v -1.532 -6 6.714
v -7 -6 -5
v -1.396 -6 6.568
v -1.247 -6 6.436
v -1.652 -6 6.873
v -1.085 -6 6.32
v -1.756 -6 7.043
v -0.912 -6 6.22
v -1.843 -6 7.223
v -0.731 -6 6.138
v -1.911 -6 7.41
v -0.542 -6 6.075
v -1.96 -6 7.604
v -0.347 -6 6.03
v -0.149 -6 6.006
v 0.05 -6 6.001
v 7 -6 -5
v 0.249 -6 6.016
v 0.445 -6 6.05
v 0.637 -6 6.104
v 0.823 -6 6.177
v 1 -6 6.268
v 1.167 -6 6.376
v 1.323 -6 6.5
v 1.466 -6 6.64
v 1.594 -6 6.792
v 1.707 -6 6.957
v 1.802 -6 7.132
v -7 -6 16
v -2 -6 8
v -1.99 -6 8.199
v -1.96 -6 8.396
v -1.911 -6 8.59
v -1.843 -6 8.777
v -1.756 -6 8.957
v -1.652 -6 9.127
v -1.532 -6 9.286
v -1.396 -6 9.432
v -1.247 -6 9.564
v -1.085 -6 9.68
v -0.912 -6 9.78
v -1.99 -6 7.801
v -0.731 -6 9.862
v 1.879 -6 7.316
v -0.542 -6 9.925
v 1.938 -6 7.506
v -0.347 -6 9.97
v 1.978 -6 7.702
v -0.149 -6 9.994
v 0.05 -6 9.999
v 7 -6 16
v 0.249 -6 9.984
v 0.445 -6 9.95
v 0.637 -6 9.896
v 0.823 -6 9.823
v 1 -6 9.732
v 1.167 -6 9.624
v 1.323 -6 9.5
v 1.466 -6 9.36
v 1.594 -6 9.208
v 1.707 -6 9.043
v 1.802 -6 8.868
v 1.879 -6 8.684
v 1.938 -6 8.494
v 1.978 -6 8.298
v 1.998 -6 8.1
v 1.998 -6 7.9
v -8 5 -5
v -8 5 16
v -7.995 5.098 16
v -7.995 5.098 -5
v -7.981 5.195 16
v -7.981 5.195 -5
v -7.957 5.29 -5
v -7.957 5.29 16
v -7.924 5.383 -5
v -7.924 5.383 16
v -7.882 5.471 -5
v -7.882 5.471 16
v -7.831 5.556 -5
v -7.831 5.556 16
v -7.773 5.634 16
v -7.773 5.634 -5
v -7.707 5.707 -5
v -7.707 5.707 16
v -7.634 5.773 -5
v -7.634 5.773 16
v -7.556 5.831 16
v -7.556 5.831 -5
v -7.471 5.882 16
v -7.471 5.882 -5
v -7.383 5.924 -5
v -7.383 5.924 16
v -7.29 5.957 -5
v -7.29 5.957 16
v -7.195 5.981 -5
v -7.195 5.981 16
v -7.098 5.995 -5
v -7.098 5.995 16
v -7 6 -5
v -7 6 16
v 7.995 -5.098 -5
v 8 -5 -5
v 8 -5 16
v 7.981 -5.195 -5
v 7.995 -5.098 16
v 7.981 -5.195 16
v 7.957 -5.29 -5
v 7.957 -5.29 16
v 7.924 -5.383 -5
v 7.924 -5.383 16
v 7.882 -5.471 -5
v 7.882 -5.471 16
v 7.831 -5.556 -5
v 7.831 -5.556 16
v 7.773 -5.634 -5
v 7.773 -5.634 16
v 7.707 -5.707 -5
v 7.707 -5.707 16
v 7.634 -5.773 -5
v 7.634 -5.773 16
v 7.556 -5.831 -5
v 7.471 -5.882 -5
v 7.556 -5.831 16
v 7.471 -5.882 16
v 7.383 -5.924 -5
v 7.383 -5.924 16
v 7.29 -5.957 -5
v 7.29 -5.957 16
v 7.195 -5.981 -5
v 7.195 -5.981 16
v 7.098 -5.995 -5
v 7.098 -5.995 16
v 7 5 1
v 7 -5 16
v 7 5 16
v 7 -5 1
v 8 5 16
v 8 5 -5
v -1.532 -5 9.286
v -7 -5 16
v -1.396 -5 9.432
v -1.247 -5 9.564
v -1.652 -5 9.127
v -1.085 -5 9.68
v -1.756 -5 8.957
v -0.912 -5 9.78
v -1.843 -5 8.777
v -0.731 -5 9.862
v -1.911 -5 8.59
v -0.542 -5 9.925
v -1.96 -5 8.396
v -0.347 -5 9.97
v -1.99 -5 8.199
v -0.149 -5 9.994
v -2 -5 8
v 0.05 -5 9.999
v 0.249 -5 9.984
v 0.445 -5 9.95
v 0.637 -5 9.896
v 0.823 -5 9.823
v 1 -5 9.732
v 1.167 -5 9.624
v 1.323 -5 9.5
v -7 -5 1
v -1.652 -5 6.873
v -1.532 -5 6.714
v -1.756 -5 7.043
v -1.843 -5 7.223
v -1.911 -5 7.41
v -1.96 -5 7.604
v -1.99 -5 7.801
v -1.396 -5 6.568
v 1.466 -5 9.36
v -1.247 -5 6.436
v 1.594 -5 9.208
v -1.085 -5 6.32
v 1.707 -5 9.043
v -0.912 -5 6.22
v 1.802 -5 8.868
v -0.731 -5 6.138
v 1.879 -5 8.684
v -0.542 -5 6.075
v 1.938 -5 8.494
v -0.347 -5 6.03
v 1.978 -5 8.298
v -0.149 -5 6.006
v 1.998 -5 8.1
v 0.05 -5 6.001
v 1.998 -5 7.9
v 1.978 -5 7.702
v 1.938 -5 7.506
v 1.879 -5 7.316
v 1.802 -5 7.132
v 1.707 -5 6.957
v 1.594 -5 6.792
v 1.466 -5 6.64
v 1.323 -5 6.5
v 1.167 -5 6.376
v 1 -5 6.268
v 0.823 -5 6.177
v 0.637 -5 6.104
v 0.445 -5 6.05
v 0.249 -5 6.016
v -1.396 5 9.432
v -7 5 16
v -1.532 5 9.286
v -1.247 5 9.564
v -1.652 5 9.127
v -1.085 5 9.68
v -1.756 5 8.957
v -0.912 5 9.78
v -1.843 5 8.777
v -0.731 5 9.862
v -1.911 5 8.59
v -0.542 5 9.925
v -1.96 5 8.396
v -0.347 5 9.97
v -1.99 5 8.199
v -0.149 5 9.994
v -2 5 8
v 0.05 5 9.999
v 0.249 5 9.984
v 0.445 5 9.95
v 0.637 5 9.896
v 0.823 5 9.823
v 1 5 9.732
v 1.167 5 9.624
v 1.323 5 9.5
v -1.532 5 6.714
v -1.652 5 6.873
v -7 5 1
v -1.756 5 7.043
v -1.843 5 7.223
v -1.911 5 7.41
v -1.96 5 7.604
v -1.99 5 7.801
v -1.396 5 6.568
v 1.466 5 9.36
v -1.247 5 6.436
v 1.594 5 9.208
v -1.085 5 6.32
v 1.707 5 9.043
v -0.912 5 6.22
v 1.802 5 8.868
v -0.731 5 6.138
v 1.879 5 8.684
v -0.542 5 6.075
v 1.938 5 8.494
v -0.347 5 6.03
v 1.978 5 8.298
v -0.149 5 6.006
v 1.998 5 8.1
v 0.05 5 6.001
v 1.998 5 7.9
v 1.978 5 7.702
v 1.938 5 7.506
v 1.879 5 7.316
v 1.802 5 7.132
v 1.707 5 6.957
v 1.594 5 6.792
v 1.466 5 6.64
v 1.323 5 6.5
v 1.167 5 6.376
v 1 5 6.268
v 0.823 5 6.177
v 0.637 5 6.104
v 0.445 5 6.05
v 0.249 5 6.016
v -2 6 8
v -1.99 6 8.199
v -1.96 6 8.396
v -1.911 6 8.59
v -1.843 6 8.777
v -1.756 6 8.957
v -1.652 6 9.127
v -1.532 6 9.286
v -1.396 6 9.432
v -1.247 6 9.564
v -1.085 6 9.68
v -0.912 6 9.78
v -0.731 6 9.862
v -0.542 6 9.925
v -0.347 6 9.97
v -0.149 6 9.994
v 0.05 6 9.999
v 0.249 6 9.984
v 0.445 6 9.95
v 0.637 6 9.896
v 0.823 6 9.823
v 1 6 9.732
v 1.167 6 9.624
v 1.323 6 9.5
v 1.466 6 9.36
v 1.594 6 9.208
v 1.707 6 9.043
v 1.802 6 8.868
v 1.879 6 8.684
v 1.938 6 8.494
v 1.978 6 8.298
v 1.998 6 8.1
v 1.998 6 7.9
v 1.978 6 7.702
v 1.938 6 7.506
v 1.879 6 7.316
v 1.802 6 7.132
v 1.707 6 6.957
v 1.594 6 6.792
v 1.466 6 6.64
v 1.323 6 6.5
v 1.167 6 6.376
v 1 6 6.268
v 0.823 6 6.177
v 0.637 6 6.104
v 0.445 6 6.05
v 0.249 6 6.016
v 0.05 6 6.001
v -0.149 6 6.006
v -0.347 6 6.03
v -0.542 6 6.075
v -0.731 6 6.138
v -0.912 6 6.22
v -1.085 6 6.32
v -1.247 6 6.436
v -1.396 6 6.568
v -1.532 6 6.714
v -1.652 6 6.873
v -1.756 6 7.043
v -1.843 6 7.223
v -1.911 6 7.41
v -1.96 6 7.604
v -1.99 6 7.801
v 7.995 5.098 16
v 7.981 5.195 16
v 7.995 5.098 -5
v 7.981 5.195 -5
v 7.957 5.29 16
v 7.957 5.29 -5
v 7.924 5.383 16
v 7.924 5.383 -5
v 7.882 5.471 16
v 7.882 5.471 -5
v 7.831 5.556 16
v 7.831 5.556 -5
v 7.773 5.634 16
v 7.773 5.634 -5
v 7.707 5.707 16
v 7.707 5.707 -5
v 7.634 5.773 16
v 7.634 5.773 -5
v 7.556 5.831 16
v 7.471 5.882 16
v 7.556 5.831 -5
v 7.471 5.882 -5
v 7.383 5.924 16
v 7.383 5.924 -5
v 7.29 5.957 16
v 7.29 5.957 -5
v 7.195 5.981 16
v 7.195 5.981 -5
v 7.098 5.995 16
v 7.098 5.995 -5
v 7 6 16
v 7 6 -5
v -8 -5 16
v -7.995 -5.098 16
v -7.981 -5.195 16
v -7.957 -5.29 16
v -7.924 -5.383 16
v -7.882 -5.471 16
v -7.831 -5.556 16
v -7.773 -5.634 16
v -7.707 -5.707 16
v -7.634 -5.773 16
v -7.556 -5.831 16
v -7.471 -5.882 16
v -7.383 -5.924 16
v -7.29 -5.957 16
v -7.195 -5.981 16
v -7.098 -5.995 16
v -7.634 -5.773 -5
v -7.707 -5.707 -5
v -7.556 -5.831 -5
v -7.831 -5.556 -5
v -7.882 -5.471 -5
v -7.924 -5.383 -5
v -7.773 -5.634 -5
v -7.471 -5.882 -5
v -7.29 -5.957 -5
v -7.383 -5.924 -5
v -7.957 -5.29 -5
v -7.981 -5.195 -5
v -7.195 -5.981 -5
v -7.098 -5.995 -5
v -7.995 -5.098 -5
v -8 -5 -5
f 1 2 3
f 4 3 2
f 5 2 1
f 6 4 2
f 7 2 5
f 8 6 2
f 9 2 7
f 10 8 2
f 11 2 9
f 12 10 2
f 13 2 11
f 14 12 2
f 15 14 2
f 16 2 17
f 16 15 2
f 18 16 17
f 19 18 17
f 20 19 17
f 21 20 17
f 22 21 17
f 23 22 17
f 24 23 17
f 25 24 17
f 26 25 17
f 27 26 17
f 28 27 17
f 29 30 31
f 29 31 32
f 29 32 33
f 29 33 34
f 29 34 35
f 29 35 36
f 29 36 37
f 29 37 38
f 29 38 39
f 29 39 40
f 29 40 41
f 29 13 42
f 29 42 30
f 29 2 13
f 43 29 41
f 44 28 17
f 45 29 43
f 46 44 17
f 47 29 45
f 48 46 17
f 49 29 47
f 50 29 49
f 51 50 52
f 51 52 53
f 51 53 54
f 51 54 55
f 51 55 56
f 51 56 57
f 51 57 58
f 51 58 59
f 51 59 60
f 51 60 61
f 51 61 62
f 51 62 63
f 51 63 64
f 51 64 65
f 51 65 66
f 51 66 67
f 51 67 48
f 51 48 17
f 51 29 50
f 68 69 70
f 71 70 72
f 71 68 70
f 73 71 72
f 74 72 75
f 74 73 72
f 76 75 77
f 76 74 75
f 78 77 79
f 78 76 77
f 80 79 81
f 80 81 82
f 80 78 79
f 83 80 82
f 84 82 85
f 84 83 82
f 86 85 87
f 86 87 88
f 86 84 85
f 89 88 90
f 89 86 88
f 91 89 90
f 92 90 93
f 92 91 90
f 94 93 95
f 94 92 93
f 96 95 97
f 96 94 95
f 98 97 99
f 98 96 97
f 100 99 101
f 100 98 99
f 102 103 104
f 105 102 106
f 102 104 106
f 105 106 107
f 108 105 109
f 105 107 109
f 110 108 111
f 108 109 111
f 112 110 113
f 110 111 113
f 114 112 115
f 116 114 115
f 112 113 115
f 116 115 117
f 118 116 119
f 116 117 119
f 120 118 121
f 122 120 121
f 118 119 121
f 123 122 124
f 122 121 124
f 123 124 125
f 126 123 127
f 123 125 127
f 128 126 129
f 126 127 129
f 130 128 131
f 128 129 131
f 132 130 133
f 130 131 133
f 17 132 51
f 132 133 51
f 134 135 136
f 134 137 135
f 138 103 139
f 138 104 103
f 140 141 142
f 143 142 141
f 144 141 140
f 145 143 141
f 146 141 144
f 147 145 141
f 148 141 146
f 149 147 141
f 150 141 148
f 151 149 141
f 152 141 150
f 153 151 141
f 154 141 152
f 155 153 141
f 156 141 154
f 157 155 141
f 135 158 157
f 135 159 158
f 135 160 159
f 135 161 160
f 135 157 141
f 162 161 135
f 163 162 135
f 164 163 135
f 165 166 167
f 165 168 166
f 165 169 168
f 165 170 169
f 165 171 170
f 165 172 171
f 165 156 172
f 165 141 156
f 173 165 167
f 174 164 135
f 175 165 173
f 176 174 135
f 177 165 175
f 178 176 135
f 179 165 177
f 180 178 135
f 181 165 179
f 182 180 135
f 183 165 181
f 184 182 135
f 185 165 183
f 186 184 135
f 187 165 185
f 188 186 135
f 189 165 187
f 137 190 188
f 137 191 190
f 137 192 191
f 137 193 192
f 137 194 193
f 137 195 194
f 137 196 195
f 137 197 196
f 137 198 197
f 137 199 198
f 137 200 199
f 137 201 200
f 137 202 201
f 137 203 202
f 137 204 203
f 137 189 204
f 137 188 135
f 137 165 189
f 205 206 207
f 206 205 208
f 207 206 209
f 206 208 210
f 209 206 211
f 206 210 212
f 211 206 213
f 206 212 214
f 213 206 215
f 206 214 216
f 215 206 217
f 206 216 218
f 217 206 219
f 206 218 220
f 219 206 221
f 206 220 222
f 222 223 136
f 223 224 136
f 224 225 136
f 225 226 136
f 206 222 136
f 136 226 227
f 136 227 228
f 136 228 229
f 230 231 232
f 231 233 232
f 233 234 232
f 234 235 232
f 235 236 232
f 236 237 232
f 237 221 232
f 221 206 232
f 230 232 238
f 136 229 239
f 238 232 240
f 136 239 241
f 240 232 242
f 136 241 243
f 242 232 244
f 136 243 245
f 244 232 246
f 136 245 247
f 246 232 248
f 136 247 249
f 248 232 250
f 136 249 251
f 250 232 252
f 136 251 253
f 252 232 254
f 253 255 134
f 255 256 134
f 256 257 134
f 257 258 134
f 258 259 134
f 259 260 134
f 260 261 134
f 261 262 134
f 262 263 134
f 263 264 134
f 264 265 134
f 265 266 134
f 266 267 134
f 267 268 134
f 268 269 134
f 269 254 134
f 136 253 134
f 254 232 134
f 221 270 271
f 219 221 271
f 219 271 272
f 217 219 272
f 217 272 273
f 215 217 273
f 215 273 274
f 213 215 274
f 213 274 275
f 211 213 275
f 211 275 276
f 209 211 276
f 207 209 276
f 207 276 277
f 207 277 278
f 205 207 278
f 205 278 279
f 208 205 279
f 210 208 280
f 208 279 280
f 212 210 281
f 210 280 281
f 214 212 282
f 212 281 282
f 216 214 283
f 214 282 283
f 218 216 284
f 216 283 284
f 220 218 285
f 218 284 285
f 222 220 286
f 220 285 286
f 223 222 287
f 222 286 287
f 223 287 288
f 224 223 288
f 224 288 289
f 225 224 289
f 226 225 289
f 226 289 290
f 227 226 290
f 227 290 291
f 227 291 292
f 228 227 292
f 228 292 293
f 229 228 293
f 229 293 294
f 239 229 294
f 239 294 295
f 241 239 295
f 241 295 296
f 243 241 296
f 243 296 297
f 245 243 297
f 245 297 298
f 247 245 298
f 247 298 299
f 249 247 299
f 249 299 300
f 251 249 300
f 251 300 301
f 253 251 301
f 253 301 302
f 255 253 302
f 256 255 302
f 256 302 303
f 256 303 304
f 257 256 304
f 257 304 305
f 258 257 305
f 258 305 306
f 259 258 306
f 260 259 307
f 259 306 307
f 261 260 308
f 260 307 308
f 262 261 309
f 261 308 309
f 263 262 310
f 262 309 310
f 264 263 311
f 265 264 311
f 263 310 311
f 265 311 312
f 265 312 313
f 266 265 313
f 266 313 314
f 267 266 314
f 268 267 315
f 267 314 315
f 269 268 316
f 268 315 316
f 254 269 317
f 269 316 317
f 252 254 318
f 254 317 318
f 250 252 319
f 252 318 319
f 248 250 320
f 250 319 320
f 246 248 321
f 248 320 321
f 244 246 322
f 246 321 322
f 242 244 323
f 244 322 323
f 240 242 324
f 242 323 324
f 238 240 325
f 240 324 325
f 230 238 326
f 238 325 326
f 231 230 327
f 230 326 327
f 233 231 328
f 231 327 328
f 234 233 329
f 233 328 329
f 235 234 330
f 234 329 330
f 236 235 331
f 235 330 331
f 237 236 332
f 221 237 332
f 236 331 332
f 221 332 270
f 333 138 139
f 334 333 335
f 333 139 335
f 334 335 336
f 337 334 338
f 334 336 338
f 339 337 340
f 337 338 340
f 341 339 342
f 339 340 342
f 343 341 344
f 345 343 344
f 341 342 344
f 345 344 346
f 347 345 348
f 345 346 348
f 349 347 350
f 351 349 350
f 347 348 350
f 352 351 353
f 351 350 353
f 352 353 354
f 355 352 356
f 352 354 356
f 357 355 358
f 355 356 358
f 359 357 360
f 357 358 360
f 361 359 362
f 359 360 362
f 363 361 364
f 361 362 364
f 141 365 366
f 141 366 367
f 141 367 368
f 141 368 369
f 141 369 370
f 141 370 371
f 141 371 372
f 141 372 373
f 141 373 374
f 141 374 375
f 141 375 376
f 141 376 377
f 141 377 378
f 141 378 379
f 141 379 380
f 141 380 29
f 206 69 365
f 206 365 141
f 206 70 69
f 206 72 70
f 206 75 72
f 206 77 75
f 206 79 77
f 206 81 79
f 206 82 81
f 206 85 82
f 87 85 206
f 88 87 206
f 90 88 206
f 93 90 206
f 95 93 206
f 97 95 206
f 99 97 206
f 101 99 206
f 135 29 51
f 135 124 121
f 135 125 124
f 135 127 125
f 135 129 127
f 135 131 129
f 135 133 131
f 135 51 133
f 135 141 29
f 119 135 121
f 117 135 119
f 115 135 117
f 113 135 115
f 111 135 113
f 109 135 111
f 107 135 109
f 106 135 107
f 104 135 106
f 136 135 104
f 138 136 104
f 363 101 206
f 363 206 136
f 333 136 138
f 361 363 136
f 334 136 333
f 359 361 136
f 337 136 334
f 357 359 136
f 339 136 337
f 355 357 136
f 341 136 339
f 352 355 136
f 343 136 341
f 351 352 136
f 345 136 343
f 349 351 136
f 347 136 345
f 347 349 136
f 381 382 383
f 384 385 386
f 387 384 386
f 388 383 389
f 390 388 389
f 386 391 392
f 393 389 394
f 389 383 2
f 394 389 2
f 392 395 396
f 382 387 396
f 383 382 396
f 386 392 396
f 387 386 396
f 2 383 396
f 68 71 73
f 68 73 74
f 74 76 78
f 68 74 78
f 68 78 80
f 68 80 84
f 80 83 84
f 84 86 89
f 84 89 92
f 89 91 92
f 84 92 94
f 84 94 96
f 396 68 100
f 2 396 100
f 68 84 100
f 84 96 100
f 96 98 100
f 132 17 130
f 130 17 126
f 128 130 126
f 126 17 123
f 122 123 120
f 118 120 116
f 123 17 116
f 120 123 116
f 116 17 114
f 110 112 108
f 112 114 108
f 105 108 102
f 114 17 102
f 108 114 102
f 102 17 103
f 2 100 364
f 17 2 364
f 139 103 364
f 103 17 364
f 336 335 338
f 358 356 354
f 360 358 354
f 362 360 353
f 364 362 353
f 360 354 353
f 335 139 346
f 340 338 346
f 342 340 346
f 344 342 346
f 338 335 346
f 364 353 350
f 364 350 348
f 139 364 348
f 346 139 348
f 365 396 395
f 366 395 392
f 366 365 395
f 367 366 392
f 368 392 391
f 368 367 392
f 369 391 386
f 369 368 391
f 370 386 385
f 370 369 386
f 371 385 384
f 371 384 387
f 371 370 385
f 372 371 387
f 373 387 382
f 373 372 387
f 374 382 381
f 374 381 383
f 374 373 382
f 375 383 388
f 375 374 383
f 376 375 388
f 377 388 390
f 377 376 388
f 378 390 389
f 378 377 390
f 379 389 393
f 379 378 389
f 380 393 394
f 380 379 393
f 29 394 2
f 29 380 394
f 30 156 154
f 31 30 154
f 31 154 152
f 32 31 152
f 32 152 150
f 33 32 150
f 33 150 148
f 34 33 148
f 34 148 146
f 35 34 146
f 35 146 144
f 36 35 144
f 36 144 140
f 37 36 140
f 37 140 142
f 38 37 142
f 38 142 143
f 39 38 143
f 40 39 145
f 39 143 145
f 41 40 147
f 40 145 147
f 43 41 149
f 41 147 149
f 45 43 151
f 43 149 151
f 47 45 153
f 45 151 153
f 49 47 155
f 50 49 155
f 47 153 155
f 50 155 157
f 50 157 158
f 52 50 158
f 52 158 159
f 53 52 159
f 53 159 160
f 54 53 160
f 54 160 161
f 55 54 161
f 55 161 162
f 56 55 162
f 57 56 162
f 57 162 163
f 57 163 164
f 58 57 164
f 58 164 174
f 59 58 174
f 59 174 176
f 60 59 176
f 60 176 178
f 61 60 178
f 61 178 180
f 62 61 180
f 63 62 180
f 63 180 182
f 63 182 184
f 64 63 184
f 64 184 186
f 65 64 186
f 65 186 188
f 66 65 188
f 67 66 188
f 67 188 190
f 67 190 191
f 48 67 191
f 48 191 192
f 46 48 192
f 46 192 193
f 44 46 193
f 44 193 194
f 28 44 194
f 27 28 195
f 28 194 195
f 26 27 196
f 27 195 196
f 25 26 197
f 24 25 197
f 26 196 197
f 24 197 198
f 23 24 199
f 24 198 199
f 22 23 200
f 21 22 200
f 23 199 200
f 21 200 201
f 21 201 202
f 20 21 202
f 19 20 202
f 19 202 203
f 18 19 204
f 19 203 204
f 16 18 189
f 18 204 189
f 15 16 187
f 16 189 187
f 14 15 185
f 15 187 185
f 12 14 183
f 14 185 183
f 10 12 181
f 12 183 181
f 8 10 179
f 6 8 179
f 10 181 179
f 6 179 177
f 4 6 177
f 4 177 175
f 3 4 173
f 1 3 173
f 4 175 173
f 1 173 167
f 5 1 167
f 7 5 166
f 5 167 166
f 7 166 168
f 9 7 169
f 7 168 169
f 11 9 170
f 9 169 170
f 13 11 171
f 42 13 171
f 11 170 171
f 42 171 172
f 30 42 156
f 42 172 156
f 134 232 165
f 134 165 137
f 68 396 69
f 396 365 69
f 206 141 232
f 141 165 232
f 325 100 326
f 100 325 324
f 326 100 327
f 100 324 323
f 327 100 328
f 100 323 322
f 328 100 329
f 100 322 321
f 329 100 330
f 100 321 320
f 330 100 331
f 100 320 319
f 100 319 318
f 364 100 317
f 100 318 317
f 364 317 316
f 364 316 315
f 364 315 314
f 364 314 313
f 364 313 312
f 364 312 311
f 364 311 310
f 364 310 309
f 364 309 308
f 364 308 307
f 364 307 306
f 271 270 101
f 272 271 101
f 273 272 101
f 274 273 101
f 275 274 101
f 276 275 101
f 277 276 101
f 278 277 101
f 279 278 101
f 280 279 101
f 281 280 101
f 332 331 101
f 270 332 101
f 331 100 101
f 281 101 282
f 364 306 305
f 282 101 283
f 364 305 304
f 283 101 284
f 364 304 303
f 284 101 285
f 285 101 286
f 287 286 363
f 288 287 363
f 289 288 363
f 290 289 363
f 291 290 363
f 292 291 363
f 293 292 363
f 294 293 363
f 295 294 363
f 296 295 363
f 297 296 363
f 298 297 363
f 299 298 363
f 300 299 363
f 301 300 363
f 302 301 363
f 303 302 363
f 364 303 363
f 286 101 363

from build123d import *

# Parameters (mm, degrees)
F0_W     = 16
F0_H     = 12
F1_DEPTH = 16
F2_T     = -1
F4_D     = 4
F5_DEPTH = 5
F6_R     = 1


with BuildPart() as f1:
    # F0 (on Top) → F1 (new body)
    with BuildSketch(Plane.XY):
        Rectangle(F0_W, F0_H)
    extrude(amount=F1_DEPTH)

    # F2
    f2_openings = [f1.faces().sort_by_distance(p)[0] for p in [
        (0, 0, 16),
    ]]
    offset(amount=F2_T, openings=f2_openings)

    # F4 (through all)
    with Locations(Plane.XZ.offset(6)):
        with Locations((0, 8)):
            Hole(F4_D / 2)

    # F5 (add): a face of the model
    f5_faces = [f1.faces().sort_by_distance(p)[0] for p in [
        (0, 0, 0),
    ]]
    extrude(f5_faces, amount=F5_DEPTH)

    # F6
    f6_edges = [f1.edges().sort_by_distance(p)[0] for p in [
        (8, -6, 5.5),
        (-8, -6, 5.5),
        (8, 6, 5.5),
        (-8, 6, 5.5),
    ]]
    fillet(f6_edges, radius=F6_R)


solid = f1.part
